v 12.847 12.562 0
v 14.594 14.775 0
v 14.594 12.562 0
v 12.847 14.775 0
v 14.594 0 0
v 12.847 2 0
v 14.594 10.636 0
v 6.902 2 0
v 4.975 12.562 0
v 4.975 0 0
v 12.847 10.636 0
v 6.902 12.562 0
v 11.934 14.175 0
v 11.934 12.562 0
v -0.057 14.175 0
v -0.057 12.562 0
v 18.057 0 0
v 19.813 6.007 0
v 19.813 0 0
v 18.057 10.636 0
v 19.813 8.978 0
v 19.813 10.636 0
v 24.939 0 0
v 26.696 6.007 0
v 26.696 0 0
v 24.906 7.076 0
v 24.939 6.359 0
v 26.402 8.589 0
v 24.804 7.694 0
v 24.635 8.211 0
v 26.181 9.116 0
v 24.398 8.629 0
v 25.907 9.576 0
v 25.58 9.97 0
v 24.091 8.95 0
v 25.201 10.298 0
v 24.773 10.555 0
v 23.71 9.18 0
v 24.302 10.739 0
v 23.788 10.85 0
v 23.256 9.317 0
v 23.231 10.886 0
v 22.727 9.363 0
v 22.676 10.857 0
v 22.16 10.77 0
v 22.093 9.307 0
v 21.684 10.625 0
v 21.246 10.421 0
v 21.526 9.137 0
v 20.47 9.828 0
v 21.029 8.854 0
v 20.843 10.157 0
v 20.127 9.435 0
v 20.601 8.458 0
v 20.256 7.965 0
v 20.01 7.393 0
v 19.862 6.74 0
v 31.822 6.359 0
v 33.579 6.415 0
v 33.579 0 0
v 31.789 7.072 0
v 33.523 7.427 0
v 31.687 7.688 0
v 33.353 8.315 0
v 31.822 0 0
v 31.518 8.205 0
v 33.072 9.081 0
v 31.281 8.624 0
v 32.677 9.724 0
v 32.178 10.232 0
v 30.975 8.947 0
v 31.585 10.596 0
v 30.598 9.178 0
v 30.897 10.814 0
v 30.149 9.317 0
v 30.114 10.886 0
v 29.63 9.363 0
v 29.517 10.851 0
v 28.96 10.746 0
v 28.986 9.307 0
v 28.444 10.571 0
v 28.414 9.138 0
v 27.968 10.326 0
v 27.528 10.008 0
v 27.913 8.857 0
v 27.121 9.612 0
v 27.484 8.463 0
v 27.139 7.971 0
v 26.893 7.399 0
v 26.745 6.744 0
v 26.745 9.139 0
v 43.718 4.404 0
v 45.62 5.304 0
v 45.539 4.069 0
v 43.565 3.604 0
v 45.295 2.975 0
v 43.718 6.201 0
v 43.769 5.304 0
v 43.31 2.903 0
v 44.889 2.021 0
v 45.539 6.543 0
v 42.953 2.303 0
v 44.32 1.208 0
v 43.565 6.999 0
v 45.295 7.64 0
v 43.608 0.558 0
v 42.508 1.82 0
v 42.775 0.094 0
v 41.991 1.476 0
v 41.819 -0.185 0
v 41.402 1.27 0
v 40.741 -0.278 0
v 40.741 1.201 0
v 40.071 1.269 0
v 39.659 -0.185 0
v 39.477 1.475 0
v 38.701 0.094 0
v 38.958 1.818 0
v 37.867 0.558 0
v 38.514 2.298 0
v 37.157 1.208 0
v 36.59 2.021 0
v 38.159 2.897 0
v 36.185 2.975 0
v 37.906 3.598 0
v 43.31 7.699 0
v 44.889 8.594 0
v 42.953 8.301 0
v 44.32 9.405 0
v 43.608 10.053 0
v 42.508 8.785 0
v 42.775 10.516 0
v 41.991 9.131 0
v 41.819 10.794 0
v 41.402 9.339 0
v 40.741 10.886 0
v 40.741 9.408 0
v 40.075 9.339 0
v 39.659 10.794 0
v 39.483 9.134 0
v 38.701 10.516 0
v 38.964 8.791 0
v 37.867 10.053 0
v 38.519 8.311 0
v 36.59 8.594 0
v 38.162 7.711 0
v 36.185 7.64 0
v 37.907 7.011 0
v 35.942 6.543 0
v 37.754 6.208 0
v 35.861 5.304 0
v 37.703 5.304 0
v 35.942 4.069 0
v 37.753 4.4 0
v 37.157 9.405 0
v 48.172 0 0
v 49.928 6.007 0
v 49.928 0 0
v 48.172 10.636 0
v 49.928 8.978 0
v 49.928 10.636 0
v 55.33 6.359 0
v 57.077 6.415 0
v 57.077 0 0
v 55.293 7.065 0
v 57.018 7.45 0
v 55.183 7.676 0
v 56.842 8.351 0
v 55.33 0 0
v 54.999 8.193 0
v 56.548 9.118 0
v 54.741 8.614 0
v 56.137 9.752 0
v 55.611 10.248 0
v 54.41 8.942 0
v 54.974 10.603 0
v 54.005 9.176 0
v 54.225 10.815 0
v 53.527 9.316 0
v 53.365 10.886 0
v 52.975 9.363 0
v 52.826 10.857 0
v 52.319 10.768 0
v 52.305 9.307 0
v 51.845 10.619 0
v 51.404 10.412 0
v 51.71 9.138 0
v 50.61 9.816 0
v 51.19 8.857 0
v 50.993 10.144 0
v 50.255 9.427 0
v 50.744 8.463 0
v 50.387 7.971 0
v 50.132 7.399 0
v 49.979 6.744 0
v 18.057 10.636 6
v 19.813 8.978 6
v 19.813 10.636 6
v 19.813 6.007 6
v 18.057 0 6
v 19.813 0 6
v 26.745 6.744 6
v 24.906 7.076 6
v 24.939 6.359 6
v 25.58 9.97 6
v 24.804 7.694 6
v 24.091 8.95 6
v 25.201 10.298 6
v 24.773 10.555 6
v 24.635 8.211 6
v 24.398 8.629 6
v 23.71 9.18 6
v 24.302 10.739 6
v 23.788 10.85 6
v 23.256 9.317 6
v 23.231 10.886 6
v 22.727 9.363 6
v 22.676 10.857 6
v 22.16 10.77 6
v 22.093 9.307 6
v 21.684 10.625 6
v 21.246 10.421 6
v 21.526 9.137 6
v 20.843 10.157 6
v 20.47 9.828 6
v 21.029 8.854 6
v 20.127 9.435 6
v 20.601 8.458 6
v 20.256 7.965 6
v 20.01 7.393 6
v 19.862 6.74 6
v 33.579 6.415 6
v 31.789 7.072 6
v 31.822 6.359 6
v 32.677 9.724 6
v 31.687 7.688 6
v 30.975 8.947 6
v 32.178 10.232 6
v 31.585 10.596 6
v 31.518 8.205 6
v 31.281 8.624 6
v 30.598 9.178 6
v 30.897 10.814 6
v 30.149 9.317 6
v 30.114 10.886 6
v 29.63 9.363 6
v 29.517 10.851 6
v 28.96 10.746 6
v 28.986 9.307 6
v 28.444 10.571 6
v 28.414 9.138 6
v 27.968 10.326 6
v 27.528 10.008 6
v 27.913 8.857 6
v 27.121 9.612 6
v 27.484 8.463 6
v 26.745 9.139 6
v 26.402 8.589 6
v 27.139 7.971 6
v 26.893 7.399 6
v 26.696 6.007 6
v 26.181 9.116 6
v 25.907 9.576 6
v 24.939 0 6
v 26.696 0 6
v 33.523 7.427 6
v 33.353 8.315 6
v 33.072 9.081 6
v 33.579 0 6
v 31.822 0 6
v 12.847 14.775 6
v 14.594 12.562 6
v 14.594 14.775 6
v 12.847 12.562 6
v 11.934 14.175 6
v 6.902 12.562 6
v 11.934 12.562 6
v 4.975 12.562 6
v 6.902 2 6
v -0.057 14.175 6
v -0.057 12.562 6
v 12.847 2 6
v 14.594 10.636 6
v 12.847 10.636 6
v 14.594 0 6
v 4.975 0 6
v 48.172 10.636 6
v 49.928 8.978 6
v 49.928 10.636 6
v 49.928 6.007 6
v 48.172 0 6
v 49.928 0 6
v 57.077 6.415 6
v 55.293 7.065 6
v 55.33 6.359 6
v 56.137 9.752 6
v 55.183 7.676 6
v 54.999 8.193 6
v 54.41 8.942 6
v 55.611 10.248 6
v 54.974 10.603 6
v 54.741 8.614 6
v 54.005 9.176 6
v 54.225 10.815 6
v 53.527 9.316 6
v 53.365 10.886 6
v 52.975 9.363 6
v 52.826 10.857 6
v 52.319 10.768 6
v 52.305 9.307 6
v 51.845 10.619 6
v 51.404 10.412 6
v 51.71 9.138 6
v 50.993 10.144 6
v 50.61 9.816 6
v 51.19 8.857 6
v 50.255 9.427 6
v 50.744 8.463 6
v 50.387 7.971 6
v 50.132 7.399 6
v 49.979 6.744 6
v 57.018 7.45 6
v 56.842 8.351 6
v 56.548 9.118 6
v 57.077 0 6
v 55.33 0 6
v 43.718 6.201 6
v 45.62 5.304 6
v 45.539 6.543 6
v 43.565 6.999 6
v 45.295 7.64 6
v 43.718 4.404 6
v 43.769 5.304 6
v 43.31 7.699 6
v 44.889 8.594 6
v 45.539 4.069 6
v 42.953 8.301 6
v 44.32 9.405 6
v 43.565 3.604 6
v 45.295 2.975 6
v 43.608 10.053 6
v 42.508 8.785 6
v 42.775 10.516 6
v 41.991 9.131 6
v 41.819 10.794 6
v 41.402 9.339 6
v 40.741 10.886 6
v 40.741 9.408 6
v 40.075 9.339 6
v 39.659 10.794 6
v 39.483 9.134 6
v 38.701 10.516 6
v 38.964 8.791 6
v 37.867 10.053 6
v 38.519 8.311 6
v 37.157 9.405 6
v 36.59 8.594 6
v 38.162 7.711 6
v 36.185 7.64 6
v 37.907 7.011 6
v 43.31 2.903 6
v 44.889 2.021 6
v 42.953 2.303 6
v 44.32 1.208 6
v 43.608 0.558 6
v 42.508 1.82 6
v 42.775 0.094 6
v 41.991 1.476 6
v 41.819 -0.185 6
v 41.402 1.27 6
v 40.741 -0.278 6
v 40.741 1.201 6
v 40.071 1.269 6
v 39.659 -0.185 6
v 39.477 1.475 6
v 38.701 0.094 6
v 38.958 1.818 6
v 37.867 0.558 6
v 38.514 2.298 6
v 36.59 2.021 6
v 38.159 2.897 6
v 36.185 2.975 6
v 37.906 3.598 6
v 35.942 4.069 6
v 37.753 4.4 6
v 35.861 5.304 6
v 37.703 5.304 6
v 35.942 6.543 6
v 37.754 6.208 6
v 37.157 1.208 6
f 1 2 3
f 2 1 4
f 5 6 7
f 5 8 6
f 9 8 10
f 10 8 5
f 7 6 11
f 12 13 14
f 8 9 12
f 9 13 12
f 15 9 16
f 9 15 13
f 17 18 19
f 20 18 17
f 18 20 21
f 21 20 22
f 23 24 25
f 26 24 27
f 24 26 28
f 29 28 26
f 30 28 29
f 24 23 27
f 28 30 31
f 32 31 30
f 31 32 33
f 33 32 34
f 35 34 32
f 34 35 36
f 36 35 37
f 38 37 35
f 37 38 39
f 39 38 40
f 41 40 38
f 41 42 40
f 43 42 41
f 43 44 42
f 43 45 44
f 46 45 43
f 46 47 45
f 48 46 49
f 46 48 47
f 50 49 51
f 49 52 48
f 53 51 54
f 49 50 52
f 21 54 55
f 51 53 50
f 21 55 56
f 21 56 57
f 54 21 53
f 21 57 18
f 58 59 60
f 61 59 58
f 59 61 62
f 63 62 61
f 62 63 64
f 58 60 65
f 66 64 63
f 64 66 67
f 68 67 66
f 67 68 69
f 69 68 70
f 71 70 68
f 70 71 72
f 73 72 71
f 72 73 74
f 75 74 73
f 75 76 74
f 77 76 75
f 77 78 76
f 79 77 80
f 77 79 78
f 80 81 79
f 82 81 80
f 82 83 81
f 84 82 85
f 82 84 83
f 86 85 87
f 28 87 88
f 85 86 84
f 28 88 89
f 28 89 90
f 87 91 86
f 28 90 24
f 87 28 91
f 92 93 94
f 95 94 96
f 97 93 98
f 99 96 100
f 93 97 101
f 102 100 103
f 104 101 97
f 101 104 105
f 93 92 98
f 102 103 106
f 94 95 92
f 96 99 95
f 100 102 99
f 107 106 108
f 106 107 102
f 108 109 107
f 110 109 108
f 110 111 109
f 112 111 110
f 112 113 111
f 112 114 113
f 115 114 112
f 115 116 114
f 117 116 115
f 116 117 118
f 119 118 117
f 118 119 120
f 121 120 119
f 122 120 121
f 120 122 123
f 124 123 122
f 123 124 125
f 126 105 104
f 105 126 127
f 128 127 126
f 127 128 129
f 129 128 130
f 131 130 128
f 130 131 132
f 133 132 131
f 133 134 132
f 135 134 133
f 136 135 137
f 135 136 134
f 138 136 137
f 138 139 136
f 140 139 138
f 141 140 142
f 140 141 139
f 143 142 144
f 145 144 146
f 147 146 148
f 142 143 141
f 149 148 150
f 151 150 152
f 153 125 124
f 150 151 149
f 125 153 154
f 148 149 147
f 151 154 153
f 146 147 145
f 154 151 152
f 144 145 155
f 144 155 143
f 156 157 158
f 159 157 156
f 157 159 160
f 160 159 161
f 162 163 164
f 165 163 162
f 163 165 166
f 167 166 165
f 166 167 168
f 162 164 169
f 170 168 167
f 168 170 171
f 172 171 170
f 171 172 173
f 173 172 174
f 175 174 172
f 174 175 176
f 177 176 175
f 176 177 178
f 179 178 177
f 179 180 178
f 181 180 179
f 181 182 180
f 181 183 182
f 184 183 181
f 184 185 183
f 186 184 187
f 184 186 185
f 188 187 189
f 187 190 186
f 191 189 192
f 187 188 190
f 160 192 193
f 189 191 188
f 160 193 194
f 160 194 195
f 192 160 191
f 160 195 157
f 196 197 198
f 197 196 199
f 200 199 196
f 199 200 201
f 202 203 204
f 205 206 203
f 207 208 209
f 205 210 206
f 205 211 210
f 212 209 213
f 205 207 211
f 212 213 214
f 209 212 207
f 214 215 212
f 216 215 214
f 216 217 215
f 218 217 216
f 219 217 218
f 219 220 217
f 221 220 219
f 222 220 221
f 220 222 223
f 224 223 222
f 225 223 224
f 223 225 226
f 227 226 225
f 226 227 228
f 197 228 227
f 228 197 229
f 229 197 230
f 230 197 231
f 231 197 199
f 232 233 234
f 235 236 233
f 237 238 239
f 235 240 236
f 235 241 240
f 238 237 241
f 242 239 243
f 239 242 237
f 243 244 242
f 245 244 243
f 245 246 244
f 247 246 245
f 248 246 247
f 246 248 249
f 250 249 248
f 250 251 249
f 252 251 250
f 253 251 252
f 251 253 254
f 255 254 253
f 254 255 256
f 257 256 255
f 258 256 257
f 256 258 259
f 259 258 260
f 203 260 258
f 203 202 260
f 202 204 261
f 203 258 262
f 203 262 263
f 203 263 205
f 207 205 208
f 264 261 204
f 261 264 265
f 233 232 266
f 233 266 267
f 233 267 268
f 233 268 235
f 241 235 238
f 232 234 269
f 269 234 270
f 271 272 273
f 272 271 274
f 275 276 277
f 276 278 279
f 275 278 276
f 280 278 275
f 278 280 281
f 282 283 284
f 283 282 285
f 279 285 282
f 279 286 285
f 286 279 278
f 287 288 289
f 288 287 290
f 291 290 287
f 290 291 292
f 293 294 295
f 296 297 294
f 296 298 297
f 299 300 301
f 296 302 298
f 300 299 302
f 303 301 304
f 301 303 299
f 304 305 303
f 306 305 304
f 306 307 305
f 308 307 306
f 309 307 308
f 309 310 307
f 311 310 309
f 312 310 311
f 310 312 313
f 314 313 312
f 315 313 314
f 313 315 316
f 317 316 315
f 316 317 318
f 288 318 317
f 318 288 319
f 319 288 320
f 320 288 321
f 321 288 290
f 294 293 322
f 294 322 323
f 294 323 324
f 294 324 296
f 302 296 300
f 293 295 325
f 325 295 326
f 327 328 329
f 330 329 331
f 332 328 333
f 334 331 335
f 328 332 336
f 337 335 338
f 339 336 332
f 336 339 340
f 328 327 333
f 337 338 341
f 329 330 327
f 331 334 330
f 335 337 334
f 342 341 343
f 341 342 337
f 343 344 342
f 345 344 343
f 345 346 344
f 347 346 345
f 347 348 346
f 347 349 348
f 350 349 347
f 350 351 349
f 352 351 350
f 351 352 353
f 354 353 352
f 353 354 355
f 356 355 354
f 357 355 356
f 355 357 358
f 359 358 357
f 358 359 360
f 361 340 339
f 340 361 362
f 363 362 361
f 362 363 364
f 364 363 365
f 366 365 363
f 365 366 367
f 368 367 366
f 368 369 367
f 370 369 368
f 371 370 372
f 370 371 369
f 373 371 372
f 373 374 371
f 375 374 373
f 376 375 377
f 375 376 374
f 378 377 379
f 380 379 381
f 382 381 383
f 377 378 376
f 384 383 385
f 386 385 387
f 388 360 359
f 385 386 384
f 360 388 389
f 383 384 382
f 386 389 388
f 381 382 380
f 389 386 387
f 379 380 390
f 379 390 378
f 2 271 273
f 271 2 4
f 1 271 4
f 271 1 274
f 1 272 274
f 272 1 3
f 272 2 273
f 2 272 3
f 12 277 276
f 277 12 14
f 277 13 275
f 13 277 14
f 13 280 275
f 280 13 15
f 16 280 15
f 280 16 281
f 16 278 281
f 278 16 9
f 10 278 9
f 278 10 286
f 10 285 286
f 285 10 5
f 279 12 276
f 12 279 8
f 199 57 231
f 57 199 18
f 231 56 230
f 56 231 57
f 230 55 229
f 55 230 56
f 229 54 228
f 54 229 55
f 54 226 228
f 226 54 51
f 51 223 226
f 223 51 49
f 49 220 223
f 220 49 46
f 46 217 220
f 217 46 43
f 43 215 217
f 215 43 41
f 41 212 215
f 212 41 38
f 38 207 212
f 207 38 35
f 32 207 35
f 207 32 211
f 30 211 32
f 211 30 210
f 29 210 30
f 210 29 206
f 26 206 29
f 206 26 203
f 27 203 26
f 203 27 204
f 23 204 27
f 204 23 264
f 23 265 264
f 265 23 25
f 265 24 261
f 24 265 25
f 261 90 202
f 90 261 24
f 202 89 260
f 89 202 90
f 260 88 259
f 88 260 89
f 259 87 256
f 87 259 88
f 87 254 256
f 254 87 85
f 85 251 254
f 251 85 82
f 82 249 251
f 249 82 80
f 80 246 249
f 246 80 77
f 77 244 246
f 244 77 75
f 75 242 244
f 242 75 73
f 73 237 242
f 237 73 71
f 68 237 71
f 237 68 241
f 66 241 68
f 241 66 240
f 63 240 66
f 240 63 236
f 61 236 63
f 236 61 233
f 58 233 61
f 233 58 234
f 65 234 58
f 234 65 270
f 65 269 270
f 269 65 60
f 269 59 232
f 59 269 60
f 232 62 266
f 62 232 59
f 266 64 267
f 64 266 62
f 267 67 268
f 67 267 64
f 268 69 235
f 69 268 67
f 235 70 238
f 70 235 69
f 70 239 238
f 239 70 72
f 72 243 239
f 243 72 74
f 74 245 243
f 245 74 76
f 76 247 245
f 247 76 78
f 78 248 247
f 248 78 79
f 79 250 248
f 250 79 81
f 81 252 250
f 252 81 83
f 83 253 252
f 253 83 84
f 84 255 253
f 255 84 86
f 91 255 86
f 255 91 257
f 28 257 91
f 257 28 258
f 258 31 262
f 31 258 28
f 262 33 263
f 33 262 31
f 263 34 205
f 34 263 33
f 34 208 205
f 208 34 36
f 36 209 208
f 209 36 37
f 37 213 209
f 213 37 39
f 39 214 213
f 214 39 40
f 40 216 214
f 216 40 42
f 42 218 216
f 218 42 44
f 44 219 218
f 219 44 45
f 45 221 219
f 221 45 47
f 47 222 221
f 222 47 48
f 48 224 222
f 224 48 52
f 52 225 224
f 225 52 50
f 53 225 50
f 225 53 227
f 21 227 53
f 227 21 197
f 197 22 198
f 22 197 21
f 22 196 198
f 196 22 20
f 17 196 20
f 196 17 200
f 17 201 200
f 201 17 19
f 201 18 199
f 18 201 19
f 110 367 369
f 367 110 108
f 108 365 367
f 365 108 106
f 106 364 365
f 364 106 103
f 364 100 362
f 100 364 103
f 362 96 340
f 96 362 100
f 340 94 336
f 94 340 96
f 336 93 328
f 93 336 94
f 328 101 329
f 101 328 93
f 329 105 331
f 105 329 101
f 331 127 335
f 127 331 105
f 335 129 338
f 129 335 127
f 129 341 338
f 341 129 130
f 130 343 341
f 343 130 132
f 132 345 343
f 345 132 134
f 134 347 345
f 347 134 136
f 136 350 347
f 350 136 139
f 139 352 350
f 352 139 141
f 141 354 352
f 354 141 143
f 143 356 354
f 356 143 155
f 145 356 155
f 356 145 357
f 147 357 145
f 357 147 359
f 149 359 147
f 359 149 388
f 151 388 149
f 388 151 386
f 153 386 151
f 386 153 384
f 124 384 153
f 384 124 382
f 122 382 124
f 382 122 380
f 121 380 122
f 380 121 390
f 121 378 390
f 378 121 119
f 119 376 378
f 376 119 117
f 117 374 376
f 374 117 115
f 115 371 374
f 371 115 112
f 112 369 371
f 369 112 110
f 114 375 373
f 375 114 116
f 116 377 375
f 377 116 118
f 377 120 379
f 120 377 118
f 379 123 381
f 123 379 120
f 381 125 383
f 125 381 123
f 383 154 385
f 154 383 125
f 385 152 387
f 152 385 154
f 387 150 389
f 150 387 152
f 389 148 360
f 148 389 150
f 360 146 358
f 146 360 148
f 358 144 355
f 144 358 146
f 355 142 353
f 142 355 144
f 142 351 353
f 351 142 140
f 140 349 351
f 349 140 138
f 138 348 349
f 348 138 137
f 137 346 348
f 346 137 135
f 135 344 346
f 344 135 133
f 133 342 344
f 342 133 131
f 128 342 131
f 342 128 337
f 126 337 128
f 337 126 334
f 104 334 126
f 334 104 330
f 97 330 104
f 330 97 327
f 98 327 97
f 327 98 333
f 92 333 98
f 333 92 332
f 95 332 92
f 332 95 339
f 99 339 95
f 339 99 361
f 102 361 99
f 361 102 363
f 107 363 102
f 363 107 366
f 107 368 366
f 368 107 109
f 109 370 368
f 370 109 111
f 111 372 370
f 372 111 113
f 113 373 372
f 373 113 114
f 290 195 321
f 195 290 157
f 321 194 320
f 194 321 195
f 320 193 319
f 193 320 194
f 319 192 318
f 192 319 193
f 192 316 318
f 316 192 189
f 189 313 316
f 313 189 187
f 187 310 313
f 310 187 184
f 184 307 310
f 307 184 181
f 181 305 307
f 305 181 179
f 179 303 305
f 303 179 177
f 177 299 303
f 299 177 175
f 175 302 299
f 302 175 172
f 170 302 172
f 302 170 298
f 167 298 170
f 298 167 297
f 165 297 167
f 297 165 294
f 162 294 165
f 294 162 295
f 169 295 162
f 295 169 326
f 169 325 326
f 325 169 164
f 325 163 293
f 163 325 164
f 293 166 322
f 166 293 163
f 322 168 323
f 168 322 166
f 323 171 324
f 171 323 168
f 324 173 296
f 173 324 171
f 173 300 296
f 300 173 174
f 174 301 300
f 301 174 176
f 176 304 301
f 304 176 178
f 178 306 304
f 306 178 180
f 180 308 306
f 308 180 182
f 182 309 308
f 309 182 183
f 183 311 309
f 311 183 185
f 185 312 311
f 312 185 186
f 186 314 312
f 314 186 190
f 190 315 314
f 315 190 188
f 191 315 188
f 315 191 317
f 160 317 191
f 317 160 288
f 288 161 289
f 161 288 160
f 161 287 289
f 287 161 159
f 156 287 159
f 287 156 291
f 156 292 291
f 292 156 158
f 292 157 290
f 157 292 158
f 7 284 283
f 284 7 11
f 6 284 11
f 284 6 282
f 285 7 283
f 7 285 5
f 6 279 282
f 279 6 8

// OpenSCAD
linear_extrude(6) text("Timon", size=14, font="Deftone Stylus:style=Regular");
translate([6, 0, 0]) cube([8, 2, 6]);
